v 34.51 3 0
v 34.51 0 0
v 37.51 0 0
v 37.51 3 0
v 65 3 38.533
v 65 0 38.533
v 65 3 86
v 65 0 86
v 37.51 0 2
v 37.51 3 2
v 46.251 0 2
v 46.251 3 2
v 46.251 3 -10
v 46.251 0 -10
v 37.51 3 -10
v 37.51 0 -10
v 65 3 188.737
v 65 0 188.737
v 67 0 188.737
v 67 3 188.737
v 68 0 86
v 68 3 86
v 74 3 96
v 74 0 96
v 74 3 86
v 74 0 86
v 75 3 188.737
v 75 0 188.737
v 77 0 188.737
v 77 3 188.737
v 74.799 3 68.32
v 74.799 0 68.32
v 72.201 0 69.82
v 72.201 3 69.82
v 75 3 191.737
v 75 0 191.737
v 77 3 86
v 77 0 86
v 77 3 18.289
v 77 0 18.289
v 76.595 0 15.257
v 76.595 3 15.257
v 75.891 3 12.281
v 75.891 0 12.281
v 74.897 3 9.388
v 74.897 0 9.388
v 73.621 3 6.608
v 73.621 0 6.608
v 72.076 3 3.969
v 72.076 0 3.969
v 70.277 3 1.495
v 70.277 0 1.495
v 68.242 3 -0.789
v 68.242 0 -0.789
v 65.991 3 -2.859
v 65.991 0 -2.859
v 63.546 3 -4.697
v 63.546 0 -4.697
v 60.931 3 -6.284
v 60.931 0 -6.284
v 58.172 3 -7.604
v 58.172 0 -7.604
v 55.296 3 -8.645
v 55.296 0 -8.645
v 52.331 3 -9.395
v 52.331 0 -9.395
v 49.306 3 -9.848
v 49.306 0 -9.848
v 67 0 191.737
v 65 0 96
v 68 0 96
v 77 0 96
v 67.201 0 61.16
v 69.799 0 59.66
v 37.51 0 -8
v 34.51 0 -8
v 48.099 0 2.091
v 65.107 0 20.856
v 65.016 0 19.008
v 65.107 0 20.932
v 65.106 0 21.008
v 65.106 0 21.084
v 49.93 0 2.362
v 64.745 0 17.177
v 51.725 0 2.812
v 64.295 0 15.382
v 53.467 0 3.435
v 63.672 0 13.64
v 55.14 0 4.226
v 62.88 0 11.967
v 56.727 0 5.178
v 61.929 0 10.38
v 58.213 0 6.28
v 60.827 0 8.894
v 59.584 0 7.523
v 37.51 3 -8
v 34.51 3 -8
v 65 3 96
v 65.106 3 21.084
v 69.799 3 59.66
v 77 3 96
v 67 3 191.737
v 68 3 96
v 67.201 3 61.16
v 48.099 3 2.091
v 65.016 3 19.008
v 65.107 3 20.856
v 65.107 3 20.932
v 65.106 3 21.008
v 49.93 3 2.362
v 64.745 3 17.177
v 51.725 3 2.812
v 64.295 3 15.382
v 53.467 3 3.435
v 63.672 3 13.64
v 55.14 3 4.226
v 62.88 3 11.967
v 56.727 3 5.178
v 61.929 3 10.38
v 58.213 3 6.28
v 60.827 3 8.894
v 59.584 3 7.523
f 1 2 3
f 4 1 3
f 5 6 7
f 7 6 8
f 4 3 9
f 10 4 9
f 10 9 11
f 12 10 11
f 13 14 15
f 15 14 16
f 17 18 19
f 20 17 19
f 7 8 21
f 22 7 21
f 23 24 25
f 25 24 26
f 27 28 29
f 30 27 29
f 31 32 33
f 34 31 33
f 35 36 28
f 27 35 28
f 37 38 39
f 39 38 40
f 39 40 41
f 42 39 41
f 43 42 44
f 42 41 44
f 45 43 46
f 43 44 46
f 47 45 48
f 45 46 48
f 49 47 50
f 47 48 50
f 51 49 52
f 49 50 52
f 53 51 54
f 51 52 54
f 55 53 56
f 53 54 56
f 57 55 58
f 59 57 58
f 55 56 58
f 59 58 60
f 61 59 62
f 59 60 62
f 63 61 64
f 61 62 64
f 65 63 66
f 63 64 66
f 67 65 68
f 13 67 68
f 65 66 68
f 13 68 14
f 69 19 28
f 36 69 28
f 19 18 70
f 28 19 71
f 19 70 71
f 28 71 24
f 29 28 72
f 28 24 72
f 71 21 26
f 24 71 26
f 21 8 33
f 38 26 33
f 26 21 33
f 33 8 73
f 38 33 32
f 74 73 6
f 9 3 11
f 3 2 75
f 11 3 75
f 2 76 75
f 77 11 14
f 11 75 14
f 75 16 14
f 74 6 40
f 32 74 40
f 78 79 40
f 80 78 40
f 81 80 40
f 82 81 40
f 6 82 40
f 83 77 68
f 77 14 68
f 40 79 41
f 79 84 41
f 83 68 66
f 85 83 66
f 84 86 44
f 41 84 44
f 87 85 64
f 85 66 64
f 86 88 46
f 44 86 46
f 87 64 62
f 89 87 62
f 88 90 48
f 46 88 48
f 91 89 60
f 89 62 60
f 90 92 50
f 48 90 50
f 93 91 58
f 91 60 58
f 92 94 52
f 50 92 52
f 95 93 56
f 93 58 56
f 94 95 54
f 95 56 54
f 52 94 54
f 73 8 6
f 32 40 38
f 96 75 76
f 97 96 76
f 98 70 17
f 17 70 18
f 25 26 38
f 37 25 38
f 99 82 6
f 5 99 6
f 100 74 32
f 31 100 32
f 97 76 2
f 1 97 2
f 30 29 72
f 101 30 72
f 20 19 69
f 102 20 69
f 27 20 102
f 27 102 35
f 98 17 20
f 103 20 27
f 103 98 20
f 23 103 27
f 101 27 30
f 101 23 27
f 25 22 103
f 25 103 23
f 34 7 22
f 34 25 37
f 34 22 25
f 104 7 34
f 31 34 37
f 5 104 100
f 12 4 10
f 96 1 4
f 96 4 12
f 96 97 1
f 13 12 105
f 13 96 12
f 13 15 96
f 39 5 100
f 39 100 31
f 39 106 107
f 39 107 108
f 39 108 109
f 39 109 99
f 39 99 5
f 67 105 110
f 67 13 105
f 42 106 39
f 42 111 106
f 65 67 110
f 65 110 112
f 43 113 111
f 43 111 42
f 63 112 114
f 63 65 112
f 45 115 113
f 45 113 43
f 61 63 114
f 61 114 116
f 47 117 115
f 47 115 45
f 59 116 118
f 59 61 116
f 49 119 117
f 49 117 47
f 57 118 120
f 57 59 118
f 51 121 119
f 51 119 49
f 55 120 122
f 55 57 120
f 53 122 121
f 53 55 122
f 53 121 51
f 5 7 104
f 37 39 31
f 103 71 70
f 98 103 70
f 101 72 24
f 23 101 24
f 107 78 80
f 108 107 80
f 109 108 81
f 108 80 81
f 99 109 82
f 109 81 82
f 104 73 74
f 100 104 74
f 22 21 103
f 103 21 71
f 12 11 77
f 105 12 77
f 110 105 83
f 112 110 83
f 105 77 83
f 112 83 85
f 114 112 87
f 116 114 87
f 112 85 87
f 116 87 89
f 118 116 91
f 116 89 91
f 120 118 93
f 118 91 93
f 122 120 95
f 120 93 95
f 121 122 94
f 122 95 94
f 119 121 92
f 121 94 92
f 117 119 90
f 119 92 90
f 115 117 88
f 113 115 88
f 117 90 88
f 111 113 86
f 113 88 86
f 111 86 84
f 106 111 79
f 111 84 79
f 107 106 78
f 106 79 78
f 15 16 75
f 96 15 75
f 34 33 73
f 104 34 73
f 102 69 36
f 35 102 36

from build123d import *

# Parameters (mm, degrees)
SALIENTE_EXTRUIR1_DEPTH = 3


with BuildPart() as part:
    # Croquis1 → Saliente-Extruir1 (new body)
    with BuildSketch(Plane(origin=(0, 0, 0), x_dir=(1, 0, 0), z_dir=(0, 1, 0))):
        with BuildLine():
            Line((34.51, 4), (34.51, 0))
            Line((34.51, 0), (37.51, 0))
            Line((37.51, 0), (37.51, -2))
            Line((37.51, -2), (46.251262658, -2))
            ThreePointArc((46.251262658, -2), (59.584248365, -7.522703507), (65.106951872, -20.855689213))
            ThreePointArc((65.106951872, -20.855689213), (65.106606786, -20.969766147), (65.105571541, -21.083838906))
            Line((65.105571541, -21.083838906), (65, -38.533358743))
            Line((65, -38.533358743), (65, -86))
            Line((65, -86), (68, -86))
            Line((68, -86), (68, -96))
            Line((68, -96), (65, -96))
            Line((65, -96), (65, -117.736951872))
            Line((65, -117.736951872), (65, -188.736951872))
            Line((65, -188.736951872), (67, -188.736951872))
            Line((67, -188.736951872), (67, -191.736951872))
            Line((67, -191.736951872), (75, -191.736951872))
            Line((75, -191.736951872), (75, -188.736951872))
            Line((75, -188.736951872), (77, -188.736951872))
            Line((77, -188.736951872), (77, -96))
            Line((77, -96), (74, -96))
            Line((74, -96), (74, -86))
            Line((74, -86), (77, -86))
            Line((77, -86), (77, -64.74))
            Line((77, -64.74), (77, -38.533358743))
            Line((77, -38.533358743), (77, -23.422537226))
            Line((77, -23.422537226), (77, -18.2888412))
            ThreePointArc((77, -18.2888412), (67.142309691, 1.851968321), (46.251262658, 10))
            Line((46.251262658, 10), (37.51, 10))
            Line((37.51, 10), (37.51, 8))
            Line((37.51, 8), (34.51, 8))
            Line((34.51, 8), (34.51, 4))
        make_face()
        Polygon((67.200961894, -61.159872981), (69.799038106, -59.659872981), (74.799038106, -68.320127019), (72.200961894, -69.820127019), align=None, mode=Mode.SUBTRACT)
    extrude(amount=SALIENTE_EXTRUIR1_DEPTH)


solid = part.part
